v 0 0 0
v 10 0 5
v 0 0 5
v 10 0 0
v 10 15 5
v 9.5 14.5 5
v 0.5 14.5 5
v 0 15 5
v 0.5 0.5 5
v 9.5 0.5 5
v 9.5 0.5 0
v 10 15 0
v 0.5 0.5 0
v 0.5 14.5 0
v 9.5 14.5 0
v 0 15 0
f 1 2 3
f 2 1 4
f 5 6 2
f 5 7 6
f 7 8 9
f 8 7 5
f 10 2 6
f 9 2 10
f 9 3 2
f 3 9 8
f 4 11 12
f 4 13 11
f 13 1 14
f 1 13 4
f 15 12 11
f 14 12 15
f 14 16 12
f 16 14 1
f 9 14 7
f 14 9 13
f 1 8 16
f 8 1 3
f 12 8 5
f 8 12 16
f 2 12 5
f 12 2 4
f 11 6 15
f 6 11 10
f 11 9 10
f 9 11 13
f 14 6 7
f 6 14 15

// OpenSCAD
$fn=7;
union()
{
	hull()
	{
		translate([0,0,0])
		{
			rotate(0,[0,0,1])
			{
				cube([0.5,0.5,0.5]);
			}
		}
		translate([0,0,4.5])
		{
			rotate(0,[0,0,1])
			{
				cube([0.5,0.5,0.5]);
			}
		}
		translate([0,14.5,4.5])
		{
			rotate(0,[0,0,1])
			{
				cube([0.5,0.5,0.5]);
			}
		}
		translate([0,14.5,0])
		{
			rotate(0,[0,0,1])
			{
				cube([0.5,0.5,0.5]);
			}
		}
	}
	hull()
	{
		translate([9.5,0,0])
		{
			rotate(0,[0,0,1])
			{
				cube([0.5,0.5,0.5]);
			}
		}
		translate([9.5,0,4.5])
		{
			rotate(0,[0,0,1])
			{
				cube([0.5,0.5,0.5]);
			}
		}
		translate([9.5,14.5,4.5])
		{
			rotate(0,[0,0,1])
			{
				cube([0.5,0.5,0.5]);
			}
		}
		translate([9.5,14.5,0])
		{
			rotate(0,[0,0,1])
			{
				cube([0.5,0.5,0.5]);
			}
		}
	}
	hull()
	{
		translate([0,0,0])
		{
			rotate(0,[0,0,1])
			{
				cube([0.5,0.5,0.5]);
			}
		}
		translate([0,0,4.5])
		{
			rotate(0,[0,0,1])
			{
				cube([0.5,0.5,0.5]);
			}
		}
		translate([9.5,0,4.5])
		{
			rotate(0,[0,0,1])
			{
				cube([0.5,0.5,0.5]);
			}
		}
		translate([9.5,0,0])
		{
			rotate(0,[0,0,1])
			{
				cube([0.5,0.5,0.5]);
			}
		}
	}
	hull()
	{
		translate([0,14.5,0])
		{
			rotate(0,[0,0,1])
			{
				cube([0.5,0.5,0.5]);
			}
		}
		translate([0,14.5,4.5])
		{
			rotate(0,[0,0,1])
			{
				cube([0.5,0.5,0.5]);
			}
		}
		translate([9.5,14.5,4.5])
		{
			rotate(0,[0,0,1])
			{
				cube([0.5,0.5,0.5]);
			}
		}
		translate([9.5,14.5,0])
		{
			rotate(0,[0,0,1])
			{
				cube([0.5,0.5,0.5]);
			}
		}
	}
}
